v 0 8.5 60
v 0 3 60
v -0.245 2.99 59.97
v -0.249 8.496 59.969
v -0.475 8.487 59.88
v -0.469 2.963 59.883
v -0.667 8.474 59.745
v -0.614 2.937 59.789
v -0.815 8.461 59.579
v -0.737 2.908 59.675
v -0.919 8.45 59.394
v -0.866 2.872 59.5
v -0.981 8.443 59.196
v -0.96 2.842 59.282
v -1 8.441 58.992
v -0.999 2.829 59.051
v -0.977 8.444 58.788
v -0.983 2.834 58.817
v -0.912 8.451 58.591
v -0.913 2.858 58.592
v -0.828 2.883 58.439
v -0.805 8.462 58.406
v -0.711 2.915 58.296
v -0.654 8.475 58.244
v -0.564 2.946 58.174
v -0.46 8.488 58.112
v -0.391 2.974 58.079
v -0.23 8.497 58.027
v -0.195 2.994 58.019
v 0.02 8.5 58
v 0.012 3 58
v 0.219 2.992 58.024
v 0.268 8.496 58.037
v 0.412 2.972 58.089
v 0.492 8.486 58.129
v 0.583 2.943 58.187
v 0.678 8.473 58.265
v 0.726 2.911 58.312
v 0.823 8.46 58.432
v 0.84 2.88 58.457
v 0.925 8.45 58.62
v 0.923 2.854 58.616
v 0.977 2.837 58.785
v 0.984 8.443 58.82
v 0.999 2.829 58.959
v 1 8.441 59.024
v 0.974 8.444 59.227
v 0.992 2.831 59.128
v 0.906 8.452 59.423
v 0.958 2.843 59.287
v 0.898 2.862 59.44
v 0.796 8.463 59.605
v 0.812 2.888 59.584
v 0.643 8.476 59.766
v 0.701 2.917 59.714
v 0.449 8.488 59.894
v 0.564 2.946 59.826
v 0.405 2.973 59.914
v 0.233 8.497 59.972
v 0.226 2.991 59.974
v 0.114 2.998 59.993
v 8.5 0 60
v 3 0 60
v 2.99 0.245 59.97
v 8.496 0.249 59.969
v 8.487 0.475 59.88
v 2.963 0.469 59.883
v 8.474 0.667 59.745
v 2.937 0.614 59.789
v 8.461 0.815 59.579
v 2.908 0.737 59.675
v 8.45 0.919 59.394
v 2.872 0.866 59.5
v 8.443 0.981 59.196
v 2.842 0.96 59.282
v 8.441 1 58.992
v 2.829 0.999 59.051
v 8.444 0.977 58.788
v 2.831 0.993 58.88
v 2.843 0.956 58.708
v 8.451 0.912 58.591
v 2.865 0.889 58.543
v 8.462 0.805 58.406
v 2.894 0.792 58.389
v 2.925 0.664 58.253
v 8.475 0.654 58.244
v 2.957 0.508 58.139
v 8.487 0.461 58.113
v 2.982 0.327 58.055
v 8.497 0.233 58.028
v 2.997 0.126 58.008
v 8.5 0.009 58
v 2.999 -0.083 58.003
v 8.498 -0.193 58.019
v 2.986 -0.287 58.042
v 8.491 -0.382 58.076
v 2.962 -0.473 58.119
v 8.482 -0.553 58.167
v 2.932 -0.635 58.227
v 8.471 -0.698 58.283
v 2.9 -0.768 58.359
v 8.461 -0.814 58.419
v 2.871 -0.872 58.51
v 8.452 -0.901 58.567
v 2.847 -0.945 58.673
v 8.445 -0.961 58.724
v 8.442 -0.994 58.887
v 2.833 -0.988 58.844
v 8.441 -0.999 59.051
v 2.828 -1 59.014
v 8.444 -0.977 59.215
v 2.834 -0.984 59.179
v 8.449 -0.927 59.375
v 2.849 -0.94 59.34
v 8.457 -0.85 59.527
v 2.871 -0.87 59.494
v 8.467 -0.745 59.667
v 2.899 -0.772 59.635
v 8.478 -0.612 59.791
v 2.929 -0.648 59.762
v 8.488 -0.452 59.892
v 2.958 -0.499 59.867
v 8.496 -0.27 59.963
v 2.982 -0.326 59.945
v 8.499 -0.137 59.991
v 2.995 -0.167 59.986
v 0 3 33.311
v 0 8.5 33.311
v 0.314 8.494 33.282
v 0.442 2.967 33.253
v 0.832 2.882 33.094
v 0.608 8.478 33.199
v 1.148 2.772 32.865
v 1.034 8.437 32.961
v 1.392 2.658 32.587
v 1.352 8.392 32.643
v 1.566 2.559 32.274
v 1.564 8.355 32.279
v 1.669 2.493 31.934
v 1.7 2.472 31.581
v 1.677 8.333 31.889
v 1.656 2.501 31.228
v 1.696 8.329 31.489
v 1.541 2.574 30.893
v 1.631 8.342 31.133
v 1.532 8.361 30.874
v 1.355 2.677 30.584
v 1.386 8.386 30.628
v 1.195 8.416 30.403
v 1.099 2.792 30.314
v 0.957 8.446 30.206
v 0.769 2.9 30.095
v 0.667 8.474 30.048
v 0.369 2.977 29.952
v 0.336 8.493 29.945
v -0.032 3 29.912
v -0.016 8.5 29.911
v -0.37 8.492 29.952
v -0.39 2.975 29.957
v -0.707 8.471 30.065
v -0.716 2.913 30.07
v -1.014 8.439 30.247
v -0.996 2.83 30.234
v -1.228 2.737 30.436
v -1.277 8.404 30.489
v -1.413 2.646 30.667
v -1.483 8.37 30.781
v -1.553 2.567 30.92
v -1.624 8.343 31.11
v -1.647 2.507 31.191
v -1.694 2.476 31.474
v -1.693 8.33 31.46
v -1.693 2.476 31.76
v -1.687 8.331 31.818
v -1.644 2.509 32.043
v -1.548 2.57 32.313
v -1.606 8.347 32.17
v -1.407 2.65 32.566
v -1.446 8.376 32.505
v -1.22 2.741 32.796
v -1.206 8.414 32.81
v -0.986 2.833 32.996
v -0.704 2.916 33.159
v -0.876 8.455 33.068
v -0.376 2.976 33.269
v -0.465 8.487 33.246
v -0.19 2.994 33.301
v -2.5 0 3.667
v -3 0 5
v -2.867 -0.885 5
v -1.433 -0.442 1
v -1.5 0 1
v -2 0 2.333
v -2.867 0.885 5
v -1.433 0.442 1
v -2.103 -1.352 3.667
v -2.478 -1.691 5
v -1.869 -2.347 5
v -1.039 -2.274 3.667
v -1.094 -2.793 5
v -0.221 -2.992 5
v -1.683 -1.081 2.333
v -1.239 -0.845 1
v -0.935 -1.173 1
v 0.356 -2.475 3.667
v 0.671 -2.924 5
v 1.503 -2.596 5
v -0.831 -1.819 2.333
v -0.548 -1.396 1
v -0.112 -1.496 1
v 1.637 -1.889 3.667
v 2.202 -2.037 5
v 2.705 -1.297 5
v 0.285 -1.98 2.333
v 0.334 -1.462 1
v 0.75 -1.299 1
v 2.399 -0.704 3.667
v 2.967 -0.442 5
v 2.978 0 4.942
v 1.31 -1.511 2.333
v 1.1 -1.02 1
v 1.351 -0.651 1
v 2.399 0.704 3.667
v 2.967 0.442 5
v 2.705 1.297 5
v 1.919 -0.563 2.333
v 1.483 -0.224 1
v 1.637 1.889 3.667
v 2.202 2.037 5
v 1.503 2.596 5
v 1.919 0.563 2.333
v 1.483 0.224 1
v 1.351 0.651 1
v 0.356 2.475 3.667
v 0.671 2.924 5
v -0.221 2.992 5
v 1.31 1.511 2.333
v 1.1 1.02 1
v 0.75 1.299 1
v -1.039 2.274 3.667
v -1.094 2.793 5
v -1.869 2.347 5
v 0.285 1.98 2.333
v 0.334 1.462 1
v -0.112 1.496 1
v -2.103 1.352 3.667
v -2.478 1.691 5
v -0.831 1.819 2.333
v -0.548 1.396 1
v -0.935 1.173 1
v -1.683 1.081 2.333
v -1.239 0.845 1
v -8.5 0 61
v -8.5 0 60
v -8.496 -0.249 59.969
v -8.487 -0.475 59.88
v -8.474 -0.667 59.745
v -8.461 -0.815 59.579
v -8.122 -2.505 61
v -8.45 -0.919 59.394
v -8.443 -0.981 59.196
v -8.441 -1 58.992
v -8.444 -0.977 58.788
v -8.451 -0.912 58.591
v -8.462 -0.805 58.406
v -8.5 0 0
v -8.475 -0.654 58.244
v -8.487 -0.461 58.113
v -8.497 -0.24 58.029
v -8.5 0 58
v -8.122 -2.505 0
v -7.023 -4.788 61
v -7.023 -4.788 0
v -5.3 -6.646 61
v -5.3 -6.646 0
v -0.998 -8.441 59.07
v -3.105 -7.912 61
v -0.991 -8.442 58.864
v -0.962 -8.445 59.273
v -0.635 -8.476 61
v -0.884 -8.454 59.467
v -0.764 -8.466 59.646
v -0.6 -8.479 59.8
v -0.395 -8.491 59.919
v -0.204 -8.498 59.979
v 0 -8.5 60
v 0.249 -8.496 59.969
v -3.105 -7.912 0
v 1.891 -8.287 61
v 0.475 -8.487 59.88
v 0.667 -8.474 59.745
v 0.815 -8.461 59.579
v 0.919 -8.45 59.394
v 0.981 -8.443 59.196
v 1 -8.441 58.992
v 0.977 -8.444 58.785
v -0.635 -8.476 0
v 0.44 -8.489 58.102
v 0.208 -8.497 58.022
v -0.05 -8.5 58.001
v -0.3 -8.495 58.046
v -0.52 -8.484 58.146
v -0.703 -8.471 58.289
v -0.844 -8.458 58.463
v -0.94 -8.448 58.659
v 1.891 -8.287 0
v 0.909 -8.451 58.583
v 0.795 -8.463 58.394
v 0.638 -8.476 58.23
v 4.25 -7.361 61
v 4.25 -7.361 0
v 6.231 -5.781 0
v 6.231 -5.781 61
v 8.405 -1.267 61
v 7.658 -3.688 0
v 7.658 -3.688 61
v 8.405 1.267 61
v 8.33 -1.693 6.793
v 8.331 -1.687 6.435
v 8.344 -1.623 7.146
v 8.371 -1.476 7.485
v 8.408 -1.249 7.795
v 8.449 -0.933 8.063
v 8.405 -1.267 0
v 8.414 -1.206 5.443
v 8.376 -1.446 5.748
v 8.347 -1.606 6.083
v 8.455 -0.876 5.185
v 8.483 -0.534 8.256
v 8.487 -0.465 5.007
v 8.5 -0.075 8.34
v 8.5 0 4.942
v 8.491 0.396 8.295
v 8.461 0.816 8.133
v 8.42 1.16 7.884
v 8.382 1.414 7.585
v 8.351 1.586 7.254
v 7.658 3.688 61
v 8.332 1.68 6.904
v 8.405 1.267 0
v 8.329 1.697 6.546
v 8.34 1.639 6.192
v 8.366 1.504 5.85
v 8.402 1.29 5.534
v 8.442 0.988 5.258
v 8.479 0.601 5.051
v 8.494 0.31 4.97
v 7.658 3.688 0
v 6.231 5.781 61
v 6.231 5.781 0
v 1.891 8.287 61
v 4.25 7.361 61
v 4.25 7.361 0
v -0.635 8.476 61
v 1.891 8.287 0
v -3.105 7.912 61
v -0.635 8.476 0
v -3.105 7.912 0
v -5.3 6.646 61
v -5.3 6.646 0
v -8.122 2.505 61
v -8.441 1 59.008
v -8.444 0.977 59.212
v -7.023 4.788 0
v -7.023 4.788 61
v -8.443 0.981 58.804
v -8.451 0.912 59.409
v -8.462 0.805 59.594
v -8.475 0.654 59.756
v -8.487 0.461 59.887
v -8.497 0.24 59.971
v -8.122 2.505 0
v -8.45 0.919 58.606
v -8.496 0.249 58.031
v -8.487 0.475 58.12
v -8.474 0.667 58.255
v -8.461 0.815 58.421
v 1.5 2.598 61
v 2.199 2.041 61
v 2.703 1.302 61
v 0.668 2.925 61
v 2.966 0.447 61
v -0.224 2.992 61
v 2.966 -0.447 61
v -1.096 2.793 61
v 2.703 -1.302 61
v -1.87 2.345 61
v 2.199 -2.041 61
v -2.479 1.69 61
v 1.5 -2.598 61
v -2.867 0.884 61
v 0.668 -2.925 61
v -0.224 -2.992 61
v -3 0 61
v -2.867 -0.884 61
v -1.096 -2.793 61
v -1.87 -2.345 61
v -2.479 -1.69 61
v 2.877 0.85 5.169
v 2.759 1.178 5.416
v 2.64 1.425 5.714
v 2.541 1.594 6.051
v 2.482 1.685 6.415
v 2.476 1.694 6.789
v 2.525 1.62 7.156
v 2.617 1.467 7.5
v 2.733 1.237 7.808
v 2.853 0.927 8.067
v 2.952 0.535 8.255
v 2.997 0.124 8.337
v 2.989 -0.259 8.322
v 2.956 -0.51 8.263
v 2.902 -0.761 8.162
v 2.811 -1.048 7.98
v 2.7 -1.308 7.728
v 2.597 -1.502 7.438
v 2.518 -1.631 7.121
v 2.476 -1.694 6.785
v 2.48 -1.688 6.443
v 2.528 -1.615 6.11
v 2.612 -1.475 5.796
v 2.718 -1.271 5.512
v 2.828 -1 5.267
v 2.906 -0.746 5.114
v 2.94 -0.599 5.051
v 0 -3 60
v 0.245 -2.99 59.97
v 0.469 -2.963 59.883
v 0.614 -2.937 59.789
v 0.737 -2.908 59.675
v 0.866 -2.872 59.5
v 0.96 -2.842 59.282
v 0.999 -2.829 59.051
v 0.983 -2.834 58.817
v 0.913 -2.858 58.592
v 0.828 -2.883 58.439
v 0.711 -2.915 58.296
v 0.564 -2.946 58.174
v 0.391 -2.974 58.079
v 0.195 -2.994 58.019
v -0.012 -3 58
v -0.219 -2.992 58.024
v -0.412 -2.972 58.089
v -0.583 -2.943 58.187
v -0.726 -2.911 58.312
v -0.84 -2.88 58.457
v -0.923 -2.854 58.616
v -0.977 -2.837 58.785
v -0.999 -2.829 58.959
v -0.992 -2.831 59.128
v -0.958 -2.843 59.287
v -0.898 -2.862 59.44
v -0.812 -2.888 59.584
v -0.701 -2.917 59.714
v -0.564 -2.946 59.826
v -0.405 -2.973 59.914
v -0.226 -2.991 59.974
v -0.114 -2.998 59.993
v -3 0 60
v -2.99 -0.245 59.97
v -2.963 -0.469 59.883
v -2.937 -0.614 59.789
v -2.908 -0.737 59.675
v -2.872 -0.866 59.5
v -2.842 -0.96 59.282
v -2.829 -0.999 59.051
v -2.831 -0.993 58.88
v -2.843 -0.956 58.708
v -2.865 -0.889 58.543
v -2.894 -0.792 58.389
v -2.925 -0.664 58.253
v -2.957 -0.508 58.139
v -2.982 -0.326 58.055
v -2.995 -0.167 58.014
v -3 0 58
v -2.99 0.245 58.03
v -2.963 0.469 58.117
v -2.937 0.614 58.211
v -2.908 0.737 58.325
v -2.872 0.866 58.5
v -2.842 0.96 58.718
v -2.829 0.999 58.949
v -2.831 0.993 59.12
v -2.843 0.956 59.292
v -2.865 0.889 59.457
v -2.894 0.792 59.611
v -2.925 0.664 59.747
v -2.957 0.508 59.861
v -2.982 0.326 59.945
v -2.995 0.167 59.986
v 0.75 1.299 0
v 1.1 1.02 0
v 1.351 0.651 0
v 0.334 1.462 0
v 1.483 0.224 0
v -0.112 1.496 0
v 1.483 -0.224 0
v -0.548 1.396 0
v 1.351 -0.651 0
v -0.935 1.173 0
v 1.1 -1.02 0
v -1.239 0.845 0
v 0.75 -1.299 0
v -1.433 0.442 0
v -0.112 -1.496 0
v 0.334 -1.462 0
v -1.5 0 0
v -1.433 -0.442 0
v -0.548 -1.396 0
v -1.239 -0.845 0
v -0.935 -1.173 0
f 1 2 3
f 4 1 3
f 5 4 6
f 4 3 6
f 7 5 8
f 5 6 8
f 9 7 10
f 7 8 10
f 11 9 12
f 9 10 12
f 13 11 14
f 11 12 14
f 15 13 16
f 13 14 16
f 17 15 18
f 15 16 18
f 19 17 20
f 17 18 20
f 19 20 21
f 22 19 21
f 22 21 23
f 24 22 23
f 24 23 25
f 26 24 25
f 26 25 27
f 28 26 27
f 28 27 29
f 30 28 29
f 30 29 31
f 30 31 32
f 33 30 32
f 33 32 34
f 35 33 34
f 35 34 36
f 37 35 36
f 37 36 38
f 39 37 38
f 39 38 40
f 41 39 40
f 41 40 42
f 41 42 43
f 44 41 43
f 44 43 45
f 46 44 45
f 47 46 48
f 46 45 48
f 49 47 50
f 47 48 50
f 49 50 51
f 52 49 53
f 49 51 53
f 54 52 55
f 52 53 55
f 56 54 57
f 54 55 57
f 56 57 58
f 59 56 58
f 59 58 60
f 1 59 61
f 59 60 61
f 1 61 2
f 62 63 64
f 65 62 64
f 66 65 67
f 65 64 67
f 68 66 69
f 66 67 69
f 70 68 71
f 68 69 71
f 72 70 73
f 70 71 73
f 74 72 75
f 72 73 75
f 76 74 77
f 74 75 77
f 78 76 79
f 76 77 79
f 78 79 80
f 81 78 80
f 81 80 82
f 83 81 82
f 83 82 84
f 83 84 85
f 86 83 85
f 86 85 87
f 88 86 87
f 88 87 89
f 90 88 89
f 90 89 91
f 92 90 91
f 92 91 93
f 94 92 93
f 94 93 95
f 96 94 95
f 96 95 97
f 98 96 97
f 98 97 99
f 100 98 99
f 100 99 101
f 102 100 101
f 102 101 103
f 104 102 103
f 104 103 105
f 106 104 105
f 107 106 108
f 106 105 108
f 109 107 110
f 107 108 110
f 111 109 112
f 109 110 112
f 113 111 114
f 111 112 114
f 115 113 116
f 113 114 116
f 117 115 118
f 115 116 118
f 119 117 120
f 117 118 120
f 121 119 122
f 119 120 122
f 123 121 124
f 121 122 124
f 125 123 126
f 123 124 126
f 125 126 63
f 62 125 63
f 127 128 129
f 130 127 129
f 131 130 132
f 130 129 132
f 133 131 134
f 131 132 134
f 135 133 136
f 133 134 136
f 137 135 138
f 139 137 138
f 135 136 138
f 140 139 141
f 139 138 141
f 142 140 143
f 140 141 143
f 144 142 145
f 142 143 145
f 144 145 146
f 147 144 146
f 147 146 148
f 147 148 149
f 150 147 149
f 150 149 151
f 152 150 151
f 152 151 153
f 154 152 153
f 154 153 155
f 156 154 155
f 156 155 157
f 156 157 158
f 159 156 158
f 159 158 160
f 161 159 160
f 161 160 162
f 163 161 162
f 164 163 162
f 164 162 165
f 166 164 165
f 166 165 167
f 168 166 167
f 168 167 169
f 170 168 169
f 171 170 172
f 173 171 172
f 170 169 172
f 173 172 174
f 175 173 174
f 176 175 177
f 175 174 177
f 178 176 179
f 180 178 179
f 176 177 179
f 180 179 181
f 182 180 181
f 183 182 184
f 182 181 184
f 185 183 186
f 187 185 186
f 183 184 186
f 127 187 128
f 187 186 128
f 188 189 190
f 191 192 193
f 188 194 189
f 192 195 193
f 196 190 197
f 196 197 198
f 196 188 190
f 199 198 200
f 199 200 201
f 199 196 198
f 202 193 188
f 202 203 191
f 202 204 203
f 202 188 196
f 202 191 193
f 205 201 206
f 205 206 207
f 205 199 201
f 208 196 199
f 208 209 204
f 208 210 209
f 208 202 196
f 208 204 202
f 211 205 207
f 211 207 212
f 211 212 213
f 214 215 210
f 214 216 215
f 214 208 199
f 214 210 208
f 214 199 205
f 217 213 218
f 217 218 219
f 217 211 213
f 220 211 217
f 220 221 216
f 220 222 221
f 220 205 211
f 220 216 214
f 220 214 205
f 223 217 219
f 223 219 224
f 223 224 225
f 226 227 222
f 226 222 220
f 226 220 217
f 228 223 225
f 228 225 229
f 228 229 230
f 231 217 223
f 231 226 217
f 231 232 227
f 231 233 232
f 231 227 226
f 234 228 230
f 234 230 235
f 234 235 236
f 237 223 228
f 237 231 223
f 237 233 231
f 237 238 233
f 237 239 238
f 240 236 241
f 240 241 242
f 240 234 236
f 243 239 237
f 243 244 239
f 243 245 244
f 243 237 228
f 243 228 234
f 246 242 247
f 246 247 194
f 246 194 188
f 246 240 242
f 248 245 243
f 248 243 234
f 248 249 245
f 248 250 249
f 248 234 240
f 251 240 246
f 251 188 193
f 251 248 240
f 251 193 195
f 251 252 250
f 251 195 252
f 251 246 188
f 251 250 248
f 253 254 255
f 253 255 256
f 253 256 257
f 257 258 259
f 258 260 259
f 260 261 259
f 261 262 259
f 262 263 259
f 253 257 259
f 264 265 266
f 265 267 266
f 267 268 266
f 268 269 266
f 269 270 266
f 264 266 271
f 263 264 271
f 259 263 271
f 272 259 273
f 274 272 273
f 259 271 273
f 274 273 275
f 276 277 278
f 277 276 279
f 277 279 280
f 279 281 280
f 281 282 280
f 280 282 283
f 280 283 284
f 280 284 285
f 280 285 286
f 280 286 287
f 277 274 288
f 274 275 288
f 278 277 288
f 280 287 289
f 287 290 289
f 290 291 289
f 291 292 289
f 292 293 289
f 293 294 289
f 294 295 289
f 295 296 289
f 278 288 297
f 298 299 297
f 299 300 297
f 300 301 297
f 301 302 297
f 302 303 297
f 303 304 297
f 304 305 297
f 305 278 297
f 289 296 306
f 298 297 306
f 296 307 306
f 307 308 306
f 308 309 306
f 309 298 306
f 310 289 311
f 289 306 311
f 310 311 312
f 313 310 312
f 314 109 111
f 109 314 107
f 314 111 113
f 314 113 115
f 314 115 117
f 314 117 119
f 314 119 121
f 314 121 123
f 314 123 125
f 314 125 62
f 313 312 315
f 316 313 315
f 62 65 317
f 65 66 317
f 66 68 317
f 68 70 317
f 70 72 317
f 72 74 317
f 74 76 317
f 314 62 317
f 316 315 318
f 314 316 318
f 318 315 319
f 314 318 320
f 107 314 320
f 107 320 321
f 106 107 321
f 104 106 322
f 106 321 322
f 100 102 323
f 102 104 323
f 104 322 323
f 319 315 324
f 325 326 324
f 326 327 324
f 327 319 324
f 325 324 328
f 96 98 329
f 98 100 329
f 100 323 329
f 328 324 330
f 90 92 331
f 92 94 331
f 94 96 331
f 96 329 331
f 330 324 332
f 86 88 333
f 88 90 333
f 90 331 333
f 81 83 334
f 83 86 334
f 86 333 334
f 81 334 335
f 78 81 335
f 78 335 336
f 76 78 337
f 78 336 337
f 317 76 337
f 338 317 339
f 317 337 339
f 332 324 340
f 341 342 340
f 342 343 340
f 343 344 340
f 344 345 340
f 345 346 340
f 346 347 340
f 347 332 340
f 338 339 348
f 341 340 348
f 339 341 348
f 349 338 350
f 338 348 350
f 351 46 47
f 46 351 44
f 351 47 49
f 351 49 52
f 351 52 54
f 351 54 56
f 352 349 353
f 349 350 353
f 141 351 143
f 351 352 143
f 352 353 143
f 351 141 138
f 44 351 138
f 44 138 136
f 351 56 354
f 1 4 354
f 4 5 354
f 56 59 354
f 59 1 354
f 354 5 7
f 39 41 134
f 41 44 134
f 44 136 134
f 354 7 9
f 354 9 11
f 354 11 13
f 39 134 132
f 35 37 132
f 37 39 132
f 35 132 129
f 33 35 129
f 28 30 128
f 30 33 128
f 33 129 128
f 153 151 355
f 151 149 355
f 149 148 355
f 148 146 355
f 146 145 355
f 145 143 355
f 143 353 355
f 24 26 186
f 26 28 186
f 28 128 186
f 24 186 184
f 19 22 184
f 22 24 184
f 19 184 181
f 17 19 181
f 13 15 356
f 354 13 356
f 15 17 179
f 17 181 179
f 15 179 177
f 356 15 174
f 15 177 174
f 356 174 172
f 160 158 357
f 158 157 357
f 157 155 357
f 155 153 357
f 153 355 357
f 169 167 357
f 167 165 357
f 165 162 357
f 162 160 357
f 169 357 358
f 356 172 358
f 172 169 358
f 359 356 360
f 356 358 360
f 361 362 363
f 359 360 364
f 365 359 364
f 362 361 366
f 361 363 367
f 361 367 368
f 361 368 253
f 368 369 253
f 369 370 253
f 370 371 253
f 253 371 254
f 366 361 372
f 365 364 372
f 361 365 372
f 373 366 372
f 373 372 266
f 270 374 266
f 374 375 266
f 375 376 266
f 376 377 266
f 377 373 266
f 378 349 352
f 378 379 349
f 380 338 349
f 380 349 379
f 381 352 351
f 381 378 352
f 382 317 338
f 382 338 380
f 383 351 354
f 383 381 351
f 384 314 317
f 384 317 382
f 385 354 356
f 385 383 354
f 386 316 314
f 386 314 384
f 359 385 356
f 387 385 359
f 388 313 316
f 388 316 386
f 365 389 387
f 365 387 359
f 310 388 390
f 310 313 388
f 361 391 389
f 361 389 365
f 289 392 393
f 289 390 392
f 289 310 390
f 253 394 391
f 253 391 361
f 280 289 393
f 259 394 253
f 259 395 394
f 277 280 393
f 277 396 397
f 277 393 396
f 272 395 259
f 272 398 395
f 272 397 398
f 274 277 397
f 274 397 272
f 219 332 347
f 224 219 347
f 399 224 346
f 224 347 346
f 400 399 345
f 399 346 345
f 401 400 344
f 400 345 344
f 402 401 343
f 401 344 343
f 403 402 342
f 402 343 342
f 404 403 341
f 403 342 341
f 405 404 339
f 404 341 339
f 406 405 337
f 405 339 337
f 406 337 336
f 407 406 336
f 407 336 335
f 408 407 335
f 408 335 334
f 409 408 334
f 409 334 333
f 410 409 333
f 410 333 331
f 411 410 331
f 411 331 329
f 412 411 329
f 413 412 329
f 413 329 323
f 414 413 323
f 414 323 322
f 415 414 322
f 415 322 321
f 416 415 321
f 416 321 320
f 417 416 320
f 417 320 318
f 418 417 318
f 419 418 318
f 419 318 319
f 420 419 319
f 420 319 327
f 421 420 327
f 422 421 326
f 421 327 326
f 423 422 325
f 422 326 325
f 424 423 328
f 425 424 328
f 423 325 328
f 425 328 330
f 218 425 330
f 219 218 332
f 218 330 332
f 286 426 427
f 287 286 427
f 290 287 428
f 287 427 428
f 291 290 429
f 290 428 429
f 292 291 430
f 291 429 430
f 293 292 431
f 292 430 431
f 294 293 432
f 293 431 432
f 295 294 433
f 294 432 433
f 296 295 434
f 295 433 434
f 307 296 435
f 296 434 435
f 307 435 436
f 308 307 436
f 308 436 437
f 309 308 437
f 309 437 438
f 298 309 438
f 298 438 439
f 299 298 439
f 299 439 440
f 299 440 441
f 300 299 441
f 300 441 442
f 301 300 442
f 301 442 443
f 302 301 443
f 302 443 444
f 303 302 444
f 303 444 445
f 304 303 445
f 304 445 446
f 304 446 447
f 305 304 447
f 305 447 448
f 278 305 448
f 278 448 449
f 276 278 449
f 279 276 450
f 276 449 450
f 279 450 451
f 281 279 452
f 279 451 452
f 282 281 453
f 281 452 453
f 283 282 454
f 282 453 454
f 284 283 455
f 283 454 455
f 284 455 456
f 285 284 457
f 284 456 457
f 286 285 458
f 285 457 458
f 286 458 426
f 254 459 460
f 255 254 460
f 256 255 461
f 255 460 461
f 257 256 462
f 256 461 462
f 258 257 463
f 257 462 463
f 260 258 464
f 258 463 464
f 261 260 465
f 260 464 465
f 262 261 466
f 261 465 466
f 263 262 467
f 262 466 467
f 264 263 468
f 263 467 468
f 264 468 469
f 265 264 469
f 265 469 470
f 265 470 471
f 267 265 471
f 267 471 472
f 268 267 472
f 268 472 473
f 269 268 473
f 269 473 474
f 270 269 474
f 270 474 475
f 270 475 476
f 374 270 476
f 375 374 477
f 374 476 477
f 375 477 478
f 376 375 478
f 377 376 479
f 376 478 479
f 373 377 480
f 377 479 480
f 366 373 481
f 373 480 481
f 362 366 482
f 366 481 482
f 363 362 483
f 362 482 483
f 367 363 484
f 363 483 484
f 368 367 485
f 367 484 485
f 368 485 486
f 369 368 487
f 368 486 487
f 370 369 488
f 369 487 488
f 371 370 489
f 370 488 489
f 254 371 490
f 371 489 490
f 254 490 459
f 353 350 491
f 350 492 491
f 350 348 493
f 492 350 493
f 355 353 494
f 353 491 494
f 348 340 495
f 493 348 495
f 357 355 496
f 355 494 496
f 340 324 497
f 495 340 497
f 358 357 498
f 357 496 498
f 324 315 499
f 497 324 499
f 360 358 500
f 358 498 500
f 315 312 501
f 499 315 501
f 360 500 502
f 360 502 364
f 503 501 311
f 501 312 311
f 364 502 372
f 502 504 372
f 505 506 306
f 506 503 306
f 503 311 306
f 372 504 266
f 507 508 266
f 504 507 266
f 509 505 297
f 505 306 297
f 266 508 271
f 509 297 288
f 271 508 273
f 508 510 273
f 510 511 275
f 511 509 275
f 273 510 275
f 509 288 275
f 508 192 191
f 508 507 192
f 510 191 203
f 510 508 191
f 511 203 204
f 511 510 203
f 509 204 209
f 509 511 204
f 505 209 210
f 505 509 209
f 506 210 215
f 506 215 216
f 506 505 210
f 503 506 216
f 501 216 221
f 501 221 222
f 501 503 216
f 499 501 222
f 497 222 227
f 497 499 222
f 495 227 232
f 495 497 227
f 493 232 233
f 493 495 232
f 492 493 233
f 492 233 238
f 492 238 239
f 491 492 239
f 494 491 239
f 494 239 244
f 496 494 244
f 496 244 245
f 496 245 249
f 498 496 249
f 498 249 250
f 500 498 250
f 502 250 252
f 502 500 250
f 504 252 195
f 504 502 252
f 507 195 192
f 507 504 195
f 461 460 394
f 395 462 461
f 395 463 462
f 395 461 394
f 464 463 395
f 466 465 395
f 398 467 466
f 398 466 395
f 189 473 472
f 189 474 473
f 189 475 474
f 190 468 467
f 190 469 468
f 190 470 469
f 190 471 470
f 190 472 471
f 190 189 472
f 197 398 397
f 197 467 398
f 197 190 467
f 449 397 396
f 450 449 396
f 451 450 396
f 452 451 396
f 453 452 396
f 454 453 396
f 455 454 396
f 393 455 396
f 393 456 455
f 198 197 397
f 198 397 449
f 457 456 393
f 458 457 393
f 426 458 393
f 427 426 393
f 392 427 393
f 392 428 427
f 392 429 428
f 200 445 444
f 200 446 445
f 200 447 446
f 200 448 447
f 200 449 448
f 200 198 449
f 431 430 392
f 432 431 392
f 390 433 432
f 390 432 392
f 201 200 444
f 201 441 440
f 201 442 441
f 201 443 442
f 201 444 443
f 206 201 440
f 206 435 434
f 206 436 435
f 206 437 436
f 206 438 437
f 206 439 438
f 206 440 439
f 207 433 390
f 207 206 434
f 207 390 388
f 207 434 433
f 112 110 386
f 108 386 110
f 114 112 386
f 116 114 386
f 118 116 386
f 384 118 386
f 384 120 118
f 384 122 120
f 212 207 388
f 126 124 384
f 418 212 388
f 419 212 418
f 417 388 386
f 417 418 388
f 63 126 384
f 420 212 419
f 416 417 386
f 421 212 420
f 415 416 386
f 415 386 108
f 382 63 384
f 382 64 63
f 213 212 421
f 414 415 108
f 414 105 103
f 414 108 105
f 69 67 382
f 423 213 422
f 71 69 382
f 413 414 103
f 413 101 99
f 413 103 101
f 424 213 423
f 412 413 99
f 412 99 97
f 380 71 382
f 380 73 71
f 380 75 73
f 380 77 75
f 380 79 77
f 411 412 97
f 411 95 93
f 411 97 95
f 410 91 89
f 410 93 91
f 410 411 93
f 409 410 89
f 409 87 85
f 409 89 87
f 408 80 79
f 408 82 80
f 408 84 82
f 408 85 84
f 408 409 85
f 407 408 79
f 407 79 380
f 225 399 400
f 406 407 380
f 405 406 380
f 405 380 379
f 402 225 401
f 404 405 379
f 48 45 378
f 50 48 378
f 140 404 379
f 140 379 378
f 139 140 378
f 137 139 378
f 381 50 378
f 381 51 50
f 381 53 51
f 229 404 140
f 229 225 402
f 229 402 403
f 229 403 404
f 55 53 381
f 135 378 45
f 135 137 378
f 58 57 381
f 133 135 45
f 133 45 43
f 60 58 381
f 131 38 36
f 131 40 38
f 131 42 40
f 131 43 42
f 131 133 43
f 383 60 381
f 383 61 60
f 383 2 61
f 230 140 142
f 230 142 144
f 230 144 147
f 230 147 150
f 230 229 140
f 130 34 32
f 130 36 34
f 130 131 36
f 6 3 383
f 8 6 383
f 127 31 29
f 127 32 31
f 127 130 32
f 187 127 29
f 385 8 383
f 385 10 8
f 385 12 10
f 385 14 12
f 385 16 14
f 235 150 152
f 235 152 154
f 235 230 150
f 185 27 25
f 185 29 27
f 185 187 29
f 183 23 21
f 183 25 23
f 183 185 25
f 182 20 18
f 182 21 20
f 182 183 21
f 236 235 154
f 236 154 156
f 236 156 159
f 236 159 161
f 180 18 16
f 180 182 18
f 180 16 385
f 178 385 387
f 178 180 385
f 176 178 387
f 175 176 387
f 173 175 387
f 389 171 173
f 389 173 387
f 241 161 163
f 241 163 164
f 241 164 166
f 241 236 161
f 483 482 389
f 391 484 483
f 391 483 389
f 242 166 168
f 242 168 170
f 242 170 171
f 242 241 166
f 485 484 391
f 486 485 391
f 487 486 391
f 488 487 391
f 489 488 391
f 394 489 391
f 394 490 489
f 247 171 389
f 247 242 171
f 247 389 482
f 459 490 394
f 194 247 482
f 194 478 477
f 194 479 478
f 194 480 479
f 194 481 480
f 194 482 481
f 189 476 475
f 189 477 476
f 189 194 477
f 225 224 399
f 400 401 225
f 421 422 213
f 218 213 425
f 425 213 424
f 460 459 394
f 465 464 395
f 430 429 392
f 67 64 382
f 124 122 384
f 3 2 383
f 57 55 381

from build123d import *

# Parameters (mm, degrees)
SKETCH1_R           = 8.5
BOSS_EXTRUDE1_DEPTH = 61
SKETCH9_R           = 1.7
CUT_EXTRUDE2_DEPTH  = 6.7
SKETCH10_R          = 1
CUT_EXTRUDE3_DEPTH  = 8.7
CIRPATTERN1_COUNT   = 4
SKETCH11_R          = 1.7
CUT_EXTRUDE4_DEPTH  = 8.7


with BuildPart() as part:
    # Sketch1 → Boss-Extrude1 (new body)
    with BuildSketch(Plane.XY):
        with Locations(Location((0, 0, 0), (0, 0, 180))):
            Circle(SKETCH1_R)
    extrude(amount=BOSS_EXTRUDE1_DEPTH)

    # Sketch7 → Cut-Revolve1 (revolve, cut)
    with BuildSketch(Plane(origin=(0, 0, 0), x_dir=(0, 0, -1), z_dir=(1, 0, 0)), mode=Mode.PRIVATE) as cut_revolve1_sk:
        Polygon((-61, 3), (-5, 3), (-1, 1.5), (0, 1.5), (0, 0), (-61, 0), align=None)
    revolve(cut_revolve1_sk.sketch.rotate(Axis((0, 0, 0), (0, 0, 1)), 90), axis=Axis((0, 0, 0), (0, 0, 1)), mode=Mode.SUBTRACT)

    # Sketch9 → Cut-Extrude2 (cut)
    with BuildSketch(Plane(origin=(8.5, 0, 0), x_dir=(0, 0, -1), z_dir=(1, 0, 0))):
        with Locations((-6.641615966, 0)):
            Circle(SKETCH9_R)
    extrude(amount=-CUT_EXTRUDE2_DEPTH, mode=Mode.SUBTRACT)

    # Sketch10 → Cut-Extrude3 (cut)
    with BuildSketch(Plane(origin=(0, 0, 0), x_dir=(0, 0, -1), z_dir=(1, 0, 0))):
        with Locations(Location((-59, 0, 0), (0, 0, 180))):
            Circle(SKETCH10_R)
    cut_extrude3 = extrude(amount=-CUT_EXTRUDE3_DEPTH, mode=Mode.SUBTRACT)

    # CirPattern1: Cut-Extrude3 ×4 about axis
    cirpattern1_axis = Axis((0, 0, 61), (0, 0, 1))
    for i in range(1, CIRPATTERN1_COUNT):
        add(cut_extrude3.rotate(cirpattern1_axis, i * 360 / CIRPATTERN1_COUNT), mode=Mode.SUBTRACT)

    # Sketch11 → Cut-Extrude4 (cut)
    with BuildSketch(Plane(origin=(0, 8.5, 0), x_dir=(1, 0, 0), z_dir=(0, 1, 0))):
        with Locations(Location((0, -31.611405642, 0), (0, 0, 270))):
            Circle(SKETCH11_R)
    extrude(amount=-CUT_EXTRUDE4_DEPTH, mode=Mode.SUBTRACT)


solid = part.part
